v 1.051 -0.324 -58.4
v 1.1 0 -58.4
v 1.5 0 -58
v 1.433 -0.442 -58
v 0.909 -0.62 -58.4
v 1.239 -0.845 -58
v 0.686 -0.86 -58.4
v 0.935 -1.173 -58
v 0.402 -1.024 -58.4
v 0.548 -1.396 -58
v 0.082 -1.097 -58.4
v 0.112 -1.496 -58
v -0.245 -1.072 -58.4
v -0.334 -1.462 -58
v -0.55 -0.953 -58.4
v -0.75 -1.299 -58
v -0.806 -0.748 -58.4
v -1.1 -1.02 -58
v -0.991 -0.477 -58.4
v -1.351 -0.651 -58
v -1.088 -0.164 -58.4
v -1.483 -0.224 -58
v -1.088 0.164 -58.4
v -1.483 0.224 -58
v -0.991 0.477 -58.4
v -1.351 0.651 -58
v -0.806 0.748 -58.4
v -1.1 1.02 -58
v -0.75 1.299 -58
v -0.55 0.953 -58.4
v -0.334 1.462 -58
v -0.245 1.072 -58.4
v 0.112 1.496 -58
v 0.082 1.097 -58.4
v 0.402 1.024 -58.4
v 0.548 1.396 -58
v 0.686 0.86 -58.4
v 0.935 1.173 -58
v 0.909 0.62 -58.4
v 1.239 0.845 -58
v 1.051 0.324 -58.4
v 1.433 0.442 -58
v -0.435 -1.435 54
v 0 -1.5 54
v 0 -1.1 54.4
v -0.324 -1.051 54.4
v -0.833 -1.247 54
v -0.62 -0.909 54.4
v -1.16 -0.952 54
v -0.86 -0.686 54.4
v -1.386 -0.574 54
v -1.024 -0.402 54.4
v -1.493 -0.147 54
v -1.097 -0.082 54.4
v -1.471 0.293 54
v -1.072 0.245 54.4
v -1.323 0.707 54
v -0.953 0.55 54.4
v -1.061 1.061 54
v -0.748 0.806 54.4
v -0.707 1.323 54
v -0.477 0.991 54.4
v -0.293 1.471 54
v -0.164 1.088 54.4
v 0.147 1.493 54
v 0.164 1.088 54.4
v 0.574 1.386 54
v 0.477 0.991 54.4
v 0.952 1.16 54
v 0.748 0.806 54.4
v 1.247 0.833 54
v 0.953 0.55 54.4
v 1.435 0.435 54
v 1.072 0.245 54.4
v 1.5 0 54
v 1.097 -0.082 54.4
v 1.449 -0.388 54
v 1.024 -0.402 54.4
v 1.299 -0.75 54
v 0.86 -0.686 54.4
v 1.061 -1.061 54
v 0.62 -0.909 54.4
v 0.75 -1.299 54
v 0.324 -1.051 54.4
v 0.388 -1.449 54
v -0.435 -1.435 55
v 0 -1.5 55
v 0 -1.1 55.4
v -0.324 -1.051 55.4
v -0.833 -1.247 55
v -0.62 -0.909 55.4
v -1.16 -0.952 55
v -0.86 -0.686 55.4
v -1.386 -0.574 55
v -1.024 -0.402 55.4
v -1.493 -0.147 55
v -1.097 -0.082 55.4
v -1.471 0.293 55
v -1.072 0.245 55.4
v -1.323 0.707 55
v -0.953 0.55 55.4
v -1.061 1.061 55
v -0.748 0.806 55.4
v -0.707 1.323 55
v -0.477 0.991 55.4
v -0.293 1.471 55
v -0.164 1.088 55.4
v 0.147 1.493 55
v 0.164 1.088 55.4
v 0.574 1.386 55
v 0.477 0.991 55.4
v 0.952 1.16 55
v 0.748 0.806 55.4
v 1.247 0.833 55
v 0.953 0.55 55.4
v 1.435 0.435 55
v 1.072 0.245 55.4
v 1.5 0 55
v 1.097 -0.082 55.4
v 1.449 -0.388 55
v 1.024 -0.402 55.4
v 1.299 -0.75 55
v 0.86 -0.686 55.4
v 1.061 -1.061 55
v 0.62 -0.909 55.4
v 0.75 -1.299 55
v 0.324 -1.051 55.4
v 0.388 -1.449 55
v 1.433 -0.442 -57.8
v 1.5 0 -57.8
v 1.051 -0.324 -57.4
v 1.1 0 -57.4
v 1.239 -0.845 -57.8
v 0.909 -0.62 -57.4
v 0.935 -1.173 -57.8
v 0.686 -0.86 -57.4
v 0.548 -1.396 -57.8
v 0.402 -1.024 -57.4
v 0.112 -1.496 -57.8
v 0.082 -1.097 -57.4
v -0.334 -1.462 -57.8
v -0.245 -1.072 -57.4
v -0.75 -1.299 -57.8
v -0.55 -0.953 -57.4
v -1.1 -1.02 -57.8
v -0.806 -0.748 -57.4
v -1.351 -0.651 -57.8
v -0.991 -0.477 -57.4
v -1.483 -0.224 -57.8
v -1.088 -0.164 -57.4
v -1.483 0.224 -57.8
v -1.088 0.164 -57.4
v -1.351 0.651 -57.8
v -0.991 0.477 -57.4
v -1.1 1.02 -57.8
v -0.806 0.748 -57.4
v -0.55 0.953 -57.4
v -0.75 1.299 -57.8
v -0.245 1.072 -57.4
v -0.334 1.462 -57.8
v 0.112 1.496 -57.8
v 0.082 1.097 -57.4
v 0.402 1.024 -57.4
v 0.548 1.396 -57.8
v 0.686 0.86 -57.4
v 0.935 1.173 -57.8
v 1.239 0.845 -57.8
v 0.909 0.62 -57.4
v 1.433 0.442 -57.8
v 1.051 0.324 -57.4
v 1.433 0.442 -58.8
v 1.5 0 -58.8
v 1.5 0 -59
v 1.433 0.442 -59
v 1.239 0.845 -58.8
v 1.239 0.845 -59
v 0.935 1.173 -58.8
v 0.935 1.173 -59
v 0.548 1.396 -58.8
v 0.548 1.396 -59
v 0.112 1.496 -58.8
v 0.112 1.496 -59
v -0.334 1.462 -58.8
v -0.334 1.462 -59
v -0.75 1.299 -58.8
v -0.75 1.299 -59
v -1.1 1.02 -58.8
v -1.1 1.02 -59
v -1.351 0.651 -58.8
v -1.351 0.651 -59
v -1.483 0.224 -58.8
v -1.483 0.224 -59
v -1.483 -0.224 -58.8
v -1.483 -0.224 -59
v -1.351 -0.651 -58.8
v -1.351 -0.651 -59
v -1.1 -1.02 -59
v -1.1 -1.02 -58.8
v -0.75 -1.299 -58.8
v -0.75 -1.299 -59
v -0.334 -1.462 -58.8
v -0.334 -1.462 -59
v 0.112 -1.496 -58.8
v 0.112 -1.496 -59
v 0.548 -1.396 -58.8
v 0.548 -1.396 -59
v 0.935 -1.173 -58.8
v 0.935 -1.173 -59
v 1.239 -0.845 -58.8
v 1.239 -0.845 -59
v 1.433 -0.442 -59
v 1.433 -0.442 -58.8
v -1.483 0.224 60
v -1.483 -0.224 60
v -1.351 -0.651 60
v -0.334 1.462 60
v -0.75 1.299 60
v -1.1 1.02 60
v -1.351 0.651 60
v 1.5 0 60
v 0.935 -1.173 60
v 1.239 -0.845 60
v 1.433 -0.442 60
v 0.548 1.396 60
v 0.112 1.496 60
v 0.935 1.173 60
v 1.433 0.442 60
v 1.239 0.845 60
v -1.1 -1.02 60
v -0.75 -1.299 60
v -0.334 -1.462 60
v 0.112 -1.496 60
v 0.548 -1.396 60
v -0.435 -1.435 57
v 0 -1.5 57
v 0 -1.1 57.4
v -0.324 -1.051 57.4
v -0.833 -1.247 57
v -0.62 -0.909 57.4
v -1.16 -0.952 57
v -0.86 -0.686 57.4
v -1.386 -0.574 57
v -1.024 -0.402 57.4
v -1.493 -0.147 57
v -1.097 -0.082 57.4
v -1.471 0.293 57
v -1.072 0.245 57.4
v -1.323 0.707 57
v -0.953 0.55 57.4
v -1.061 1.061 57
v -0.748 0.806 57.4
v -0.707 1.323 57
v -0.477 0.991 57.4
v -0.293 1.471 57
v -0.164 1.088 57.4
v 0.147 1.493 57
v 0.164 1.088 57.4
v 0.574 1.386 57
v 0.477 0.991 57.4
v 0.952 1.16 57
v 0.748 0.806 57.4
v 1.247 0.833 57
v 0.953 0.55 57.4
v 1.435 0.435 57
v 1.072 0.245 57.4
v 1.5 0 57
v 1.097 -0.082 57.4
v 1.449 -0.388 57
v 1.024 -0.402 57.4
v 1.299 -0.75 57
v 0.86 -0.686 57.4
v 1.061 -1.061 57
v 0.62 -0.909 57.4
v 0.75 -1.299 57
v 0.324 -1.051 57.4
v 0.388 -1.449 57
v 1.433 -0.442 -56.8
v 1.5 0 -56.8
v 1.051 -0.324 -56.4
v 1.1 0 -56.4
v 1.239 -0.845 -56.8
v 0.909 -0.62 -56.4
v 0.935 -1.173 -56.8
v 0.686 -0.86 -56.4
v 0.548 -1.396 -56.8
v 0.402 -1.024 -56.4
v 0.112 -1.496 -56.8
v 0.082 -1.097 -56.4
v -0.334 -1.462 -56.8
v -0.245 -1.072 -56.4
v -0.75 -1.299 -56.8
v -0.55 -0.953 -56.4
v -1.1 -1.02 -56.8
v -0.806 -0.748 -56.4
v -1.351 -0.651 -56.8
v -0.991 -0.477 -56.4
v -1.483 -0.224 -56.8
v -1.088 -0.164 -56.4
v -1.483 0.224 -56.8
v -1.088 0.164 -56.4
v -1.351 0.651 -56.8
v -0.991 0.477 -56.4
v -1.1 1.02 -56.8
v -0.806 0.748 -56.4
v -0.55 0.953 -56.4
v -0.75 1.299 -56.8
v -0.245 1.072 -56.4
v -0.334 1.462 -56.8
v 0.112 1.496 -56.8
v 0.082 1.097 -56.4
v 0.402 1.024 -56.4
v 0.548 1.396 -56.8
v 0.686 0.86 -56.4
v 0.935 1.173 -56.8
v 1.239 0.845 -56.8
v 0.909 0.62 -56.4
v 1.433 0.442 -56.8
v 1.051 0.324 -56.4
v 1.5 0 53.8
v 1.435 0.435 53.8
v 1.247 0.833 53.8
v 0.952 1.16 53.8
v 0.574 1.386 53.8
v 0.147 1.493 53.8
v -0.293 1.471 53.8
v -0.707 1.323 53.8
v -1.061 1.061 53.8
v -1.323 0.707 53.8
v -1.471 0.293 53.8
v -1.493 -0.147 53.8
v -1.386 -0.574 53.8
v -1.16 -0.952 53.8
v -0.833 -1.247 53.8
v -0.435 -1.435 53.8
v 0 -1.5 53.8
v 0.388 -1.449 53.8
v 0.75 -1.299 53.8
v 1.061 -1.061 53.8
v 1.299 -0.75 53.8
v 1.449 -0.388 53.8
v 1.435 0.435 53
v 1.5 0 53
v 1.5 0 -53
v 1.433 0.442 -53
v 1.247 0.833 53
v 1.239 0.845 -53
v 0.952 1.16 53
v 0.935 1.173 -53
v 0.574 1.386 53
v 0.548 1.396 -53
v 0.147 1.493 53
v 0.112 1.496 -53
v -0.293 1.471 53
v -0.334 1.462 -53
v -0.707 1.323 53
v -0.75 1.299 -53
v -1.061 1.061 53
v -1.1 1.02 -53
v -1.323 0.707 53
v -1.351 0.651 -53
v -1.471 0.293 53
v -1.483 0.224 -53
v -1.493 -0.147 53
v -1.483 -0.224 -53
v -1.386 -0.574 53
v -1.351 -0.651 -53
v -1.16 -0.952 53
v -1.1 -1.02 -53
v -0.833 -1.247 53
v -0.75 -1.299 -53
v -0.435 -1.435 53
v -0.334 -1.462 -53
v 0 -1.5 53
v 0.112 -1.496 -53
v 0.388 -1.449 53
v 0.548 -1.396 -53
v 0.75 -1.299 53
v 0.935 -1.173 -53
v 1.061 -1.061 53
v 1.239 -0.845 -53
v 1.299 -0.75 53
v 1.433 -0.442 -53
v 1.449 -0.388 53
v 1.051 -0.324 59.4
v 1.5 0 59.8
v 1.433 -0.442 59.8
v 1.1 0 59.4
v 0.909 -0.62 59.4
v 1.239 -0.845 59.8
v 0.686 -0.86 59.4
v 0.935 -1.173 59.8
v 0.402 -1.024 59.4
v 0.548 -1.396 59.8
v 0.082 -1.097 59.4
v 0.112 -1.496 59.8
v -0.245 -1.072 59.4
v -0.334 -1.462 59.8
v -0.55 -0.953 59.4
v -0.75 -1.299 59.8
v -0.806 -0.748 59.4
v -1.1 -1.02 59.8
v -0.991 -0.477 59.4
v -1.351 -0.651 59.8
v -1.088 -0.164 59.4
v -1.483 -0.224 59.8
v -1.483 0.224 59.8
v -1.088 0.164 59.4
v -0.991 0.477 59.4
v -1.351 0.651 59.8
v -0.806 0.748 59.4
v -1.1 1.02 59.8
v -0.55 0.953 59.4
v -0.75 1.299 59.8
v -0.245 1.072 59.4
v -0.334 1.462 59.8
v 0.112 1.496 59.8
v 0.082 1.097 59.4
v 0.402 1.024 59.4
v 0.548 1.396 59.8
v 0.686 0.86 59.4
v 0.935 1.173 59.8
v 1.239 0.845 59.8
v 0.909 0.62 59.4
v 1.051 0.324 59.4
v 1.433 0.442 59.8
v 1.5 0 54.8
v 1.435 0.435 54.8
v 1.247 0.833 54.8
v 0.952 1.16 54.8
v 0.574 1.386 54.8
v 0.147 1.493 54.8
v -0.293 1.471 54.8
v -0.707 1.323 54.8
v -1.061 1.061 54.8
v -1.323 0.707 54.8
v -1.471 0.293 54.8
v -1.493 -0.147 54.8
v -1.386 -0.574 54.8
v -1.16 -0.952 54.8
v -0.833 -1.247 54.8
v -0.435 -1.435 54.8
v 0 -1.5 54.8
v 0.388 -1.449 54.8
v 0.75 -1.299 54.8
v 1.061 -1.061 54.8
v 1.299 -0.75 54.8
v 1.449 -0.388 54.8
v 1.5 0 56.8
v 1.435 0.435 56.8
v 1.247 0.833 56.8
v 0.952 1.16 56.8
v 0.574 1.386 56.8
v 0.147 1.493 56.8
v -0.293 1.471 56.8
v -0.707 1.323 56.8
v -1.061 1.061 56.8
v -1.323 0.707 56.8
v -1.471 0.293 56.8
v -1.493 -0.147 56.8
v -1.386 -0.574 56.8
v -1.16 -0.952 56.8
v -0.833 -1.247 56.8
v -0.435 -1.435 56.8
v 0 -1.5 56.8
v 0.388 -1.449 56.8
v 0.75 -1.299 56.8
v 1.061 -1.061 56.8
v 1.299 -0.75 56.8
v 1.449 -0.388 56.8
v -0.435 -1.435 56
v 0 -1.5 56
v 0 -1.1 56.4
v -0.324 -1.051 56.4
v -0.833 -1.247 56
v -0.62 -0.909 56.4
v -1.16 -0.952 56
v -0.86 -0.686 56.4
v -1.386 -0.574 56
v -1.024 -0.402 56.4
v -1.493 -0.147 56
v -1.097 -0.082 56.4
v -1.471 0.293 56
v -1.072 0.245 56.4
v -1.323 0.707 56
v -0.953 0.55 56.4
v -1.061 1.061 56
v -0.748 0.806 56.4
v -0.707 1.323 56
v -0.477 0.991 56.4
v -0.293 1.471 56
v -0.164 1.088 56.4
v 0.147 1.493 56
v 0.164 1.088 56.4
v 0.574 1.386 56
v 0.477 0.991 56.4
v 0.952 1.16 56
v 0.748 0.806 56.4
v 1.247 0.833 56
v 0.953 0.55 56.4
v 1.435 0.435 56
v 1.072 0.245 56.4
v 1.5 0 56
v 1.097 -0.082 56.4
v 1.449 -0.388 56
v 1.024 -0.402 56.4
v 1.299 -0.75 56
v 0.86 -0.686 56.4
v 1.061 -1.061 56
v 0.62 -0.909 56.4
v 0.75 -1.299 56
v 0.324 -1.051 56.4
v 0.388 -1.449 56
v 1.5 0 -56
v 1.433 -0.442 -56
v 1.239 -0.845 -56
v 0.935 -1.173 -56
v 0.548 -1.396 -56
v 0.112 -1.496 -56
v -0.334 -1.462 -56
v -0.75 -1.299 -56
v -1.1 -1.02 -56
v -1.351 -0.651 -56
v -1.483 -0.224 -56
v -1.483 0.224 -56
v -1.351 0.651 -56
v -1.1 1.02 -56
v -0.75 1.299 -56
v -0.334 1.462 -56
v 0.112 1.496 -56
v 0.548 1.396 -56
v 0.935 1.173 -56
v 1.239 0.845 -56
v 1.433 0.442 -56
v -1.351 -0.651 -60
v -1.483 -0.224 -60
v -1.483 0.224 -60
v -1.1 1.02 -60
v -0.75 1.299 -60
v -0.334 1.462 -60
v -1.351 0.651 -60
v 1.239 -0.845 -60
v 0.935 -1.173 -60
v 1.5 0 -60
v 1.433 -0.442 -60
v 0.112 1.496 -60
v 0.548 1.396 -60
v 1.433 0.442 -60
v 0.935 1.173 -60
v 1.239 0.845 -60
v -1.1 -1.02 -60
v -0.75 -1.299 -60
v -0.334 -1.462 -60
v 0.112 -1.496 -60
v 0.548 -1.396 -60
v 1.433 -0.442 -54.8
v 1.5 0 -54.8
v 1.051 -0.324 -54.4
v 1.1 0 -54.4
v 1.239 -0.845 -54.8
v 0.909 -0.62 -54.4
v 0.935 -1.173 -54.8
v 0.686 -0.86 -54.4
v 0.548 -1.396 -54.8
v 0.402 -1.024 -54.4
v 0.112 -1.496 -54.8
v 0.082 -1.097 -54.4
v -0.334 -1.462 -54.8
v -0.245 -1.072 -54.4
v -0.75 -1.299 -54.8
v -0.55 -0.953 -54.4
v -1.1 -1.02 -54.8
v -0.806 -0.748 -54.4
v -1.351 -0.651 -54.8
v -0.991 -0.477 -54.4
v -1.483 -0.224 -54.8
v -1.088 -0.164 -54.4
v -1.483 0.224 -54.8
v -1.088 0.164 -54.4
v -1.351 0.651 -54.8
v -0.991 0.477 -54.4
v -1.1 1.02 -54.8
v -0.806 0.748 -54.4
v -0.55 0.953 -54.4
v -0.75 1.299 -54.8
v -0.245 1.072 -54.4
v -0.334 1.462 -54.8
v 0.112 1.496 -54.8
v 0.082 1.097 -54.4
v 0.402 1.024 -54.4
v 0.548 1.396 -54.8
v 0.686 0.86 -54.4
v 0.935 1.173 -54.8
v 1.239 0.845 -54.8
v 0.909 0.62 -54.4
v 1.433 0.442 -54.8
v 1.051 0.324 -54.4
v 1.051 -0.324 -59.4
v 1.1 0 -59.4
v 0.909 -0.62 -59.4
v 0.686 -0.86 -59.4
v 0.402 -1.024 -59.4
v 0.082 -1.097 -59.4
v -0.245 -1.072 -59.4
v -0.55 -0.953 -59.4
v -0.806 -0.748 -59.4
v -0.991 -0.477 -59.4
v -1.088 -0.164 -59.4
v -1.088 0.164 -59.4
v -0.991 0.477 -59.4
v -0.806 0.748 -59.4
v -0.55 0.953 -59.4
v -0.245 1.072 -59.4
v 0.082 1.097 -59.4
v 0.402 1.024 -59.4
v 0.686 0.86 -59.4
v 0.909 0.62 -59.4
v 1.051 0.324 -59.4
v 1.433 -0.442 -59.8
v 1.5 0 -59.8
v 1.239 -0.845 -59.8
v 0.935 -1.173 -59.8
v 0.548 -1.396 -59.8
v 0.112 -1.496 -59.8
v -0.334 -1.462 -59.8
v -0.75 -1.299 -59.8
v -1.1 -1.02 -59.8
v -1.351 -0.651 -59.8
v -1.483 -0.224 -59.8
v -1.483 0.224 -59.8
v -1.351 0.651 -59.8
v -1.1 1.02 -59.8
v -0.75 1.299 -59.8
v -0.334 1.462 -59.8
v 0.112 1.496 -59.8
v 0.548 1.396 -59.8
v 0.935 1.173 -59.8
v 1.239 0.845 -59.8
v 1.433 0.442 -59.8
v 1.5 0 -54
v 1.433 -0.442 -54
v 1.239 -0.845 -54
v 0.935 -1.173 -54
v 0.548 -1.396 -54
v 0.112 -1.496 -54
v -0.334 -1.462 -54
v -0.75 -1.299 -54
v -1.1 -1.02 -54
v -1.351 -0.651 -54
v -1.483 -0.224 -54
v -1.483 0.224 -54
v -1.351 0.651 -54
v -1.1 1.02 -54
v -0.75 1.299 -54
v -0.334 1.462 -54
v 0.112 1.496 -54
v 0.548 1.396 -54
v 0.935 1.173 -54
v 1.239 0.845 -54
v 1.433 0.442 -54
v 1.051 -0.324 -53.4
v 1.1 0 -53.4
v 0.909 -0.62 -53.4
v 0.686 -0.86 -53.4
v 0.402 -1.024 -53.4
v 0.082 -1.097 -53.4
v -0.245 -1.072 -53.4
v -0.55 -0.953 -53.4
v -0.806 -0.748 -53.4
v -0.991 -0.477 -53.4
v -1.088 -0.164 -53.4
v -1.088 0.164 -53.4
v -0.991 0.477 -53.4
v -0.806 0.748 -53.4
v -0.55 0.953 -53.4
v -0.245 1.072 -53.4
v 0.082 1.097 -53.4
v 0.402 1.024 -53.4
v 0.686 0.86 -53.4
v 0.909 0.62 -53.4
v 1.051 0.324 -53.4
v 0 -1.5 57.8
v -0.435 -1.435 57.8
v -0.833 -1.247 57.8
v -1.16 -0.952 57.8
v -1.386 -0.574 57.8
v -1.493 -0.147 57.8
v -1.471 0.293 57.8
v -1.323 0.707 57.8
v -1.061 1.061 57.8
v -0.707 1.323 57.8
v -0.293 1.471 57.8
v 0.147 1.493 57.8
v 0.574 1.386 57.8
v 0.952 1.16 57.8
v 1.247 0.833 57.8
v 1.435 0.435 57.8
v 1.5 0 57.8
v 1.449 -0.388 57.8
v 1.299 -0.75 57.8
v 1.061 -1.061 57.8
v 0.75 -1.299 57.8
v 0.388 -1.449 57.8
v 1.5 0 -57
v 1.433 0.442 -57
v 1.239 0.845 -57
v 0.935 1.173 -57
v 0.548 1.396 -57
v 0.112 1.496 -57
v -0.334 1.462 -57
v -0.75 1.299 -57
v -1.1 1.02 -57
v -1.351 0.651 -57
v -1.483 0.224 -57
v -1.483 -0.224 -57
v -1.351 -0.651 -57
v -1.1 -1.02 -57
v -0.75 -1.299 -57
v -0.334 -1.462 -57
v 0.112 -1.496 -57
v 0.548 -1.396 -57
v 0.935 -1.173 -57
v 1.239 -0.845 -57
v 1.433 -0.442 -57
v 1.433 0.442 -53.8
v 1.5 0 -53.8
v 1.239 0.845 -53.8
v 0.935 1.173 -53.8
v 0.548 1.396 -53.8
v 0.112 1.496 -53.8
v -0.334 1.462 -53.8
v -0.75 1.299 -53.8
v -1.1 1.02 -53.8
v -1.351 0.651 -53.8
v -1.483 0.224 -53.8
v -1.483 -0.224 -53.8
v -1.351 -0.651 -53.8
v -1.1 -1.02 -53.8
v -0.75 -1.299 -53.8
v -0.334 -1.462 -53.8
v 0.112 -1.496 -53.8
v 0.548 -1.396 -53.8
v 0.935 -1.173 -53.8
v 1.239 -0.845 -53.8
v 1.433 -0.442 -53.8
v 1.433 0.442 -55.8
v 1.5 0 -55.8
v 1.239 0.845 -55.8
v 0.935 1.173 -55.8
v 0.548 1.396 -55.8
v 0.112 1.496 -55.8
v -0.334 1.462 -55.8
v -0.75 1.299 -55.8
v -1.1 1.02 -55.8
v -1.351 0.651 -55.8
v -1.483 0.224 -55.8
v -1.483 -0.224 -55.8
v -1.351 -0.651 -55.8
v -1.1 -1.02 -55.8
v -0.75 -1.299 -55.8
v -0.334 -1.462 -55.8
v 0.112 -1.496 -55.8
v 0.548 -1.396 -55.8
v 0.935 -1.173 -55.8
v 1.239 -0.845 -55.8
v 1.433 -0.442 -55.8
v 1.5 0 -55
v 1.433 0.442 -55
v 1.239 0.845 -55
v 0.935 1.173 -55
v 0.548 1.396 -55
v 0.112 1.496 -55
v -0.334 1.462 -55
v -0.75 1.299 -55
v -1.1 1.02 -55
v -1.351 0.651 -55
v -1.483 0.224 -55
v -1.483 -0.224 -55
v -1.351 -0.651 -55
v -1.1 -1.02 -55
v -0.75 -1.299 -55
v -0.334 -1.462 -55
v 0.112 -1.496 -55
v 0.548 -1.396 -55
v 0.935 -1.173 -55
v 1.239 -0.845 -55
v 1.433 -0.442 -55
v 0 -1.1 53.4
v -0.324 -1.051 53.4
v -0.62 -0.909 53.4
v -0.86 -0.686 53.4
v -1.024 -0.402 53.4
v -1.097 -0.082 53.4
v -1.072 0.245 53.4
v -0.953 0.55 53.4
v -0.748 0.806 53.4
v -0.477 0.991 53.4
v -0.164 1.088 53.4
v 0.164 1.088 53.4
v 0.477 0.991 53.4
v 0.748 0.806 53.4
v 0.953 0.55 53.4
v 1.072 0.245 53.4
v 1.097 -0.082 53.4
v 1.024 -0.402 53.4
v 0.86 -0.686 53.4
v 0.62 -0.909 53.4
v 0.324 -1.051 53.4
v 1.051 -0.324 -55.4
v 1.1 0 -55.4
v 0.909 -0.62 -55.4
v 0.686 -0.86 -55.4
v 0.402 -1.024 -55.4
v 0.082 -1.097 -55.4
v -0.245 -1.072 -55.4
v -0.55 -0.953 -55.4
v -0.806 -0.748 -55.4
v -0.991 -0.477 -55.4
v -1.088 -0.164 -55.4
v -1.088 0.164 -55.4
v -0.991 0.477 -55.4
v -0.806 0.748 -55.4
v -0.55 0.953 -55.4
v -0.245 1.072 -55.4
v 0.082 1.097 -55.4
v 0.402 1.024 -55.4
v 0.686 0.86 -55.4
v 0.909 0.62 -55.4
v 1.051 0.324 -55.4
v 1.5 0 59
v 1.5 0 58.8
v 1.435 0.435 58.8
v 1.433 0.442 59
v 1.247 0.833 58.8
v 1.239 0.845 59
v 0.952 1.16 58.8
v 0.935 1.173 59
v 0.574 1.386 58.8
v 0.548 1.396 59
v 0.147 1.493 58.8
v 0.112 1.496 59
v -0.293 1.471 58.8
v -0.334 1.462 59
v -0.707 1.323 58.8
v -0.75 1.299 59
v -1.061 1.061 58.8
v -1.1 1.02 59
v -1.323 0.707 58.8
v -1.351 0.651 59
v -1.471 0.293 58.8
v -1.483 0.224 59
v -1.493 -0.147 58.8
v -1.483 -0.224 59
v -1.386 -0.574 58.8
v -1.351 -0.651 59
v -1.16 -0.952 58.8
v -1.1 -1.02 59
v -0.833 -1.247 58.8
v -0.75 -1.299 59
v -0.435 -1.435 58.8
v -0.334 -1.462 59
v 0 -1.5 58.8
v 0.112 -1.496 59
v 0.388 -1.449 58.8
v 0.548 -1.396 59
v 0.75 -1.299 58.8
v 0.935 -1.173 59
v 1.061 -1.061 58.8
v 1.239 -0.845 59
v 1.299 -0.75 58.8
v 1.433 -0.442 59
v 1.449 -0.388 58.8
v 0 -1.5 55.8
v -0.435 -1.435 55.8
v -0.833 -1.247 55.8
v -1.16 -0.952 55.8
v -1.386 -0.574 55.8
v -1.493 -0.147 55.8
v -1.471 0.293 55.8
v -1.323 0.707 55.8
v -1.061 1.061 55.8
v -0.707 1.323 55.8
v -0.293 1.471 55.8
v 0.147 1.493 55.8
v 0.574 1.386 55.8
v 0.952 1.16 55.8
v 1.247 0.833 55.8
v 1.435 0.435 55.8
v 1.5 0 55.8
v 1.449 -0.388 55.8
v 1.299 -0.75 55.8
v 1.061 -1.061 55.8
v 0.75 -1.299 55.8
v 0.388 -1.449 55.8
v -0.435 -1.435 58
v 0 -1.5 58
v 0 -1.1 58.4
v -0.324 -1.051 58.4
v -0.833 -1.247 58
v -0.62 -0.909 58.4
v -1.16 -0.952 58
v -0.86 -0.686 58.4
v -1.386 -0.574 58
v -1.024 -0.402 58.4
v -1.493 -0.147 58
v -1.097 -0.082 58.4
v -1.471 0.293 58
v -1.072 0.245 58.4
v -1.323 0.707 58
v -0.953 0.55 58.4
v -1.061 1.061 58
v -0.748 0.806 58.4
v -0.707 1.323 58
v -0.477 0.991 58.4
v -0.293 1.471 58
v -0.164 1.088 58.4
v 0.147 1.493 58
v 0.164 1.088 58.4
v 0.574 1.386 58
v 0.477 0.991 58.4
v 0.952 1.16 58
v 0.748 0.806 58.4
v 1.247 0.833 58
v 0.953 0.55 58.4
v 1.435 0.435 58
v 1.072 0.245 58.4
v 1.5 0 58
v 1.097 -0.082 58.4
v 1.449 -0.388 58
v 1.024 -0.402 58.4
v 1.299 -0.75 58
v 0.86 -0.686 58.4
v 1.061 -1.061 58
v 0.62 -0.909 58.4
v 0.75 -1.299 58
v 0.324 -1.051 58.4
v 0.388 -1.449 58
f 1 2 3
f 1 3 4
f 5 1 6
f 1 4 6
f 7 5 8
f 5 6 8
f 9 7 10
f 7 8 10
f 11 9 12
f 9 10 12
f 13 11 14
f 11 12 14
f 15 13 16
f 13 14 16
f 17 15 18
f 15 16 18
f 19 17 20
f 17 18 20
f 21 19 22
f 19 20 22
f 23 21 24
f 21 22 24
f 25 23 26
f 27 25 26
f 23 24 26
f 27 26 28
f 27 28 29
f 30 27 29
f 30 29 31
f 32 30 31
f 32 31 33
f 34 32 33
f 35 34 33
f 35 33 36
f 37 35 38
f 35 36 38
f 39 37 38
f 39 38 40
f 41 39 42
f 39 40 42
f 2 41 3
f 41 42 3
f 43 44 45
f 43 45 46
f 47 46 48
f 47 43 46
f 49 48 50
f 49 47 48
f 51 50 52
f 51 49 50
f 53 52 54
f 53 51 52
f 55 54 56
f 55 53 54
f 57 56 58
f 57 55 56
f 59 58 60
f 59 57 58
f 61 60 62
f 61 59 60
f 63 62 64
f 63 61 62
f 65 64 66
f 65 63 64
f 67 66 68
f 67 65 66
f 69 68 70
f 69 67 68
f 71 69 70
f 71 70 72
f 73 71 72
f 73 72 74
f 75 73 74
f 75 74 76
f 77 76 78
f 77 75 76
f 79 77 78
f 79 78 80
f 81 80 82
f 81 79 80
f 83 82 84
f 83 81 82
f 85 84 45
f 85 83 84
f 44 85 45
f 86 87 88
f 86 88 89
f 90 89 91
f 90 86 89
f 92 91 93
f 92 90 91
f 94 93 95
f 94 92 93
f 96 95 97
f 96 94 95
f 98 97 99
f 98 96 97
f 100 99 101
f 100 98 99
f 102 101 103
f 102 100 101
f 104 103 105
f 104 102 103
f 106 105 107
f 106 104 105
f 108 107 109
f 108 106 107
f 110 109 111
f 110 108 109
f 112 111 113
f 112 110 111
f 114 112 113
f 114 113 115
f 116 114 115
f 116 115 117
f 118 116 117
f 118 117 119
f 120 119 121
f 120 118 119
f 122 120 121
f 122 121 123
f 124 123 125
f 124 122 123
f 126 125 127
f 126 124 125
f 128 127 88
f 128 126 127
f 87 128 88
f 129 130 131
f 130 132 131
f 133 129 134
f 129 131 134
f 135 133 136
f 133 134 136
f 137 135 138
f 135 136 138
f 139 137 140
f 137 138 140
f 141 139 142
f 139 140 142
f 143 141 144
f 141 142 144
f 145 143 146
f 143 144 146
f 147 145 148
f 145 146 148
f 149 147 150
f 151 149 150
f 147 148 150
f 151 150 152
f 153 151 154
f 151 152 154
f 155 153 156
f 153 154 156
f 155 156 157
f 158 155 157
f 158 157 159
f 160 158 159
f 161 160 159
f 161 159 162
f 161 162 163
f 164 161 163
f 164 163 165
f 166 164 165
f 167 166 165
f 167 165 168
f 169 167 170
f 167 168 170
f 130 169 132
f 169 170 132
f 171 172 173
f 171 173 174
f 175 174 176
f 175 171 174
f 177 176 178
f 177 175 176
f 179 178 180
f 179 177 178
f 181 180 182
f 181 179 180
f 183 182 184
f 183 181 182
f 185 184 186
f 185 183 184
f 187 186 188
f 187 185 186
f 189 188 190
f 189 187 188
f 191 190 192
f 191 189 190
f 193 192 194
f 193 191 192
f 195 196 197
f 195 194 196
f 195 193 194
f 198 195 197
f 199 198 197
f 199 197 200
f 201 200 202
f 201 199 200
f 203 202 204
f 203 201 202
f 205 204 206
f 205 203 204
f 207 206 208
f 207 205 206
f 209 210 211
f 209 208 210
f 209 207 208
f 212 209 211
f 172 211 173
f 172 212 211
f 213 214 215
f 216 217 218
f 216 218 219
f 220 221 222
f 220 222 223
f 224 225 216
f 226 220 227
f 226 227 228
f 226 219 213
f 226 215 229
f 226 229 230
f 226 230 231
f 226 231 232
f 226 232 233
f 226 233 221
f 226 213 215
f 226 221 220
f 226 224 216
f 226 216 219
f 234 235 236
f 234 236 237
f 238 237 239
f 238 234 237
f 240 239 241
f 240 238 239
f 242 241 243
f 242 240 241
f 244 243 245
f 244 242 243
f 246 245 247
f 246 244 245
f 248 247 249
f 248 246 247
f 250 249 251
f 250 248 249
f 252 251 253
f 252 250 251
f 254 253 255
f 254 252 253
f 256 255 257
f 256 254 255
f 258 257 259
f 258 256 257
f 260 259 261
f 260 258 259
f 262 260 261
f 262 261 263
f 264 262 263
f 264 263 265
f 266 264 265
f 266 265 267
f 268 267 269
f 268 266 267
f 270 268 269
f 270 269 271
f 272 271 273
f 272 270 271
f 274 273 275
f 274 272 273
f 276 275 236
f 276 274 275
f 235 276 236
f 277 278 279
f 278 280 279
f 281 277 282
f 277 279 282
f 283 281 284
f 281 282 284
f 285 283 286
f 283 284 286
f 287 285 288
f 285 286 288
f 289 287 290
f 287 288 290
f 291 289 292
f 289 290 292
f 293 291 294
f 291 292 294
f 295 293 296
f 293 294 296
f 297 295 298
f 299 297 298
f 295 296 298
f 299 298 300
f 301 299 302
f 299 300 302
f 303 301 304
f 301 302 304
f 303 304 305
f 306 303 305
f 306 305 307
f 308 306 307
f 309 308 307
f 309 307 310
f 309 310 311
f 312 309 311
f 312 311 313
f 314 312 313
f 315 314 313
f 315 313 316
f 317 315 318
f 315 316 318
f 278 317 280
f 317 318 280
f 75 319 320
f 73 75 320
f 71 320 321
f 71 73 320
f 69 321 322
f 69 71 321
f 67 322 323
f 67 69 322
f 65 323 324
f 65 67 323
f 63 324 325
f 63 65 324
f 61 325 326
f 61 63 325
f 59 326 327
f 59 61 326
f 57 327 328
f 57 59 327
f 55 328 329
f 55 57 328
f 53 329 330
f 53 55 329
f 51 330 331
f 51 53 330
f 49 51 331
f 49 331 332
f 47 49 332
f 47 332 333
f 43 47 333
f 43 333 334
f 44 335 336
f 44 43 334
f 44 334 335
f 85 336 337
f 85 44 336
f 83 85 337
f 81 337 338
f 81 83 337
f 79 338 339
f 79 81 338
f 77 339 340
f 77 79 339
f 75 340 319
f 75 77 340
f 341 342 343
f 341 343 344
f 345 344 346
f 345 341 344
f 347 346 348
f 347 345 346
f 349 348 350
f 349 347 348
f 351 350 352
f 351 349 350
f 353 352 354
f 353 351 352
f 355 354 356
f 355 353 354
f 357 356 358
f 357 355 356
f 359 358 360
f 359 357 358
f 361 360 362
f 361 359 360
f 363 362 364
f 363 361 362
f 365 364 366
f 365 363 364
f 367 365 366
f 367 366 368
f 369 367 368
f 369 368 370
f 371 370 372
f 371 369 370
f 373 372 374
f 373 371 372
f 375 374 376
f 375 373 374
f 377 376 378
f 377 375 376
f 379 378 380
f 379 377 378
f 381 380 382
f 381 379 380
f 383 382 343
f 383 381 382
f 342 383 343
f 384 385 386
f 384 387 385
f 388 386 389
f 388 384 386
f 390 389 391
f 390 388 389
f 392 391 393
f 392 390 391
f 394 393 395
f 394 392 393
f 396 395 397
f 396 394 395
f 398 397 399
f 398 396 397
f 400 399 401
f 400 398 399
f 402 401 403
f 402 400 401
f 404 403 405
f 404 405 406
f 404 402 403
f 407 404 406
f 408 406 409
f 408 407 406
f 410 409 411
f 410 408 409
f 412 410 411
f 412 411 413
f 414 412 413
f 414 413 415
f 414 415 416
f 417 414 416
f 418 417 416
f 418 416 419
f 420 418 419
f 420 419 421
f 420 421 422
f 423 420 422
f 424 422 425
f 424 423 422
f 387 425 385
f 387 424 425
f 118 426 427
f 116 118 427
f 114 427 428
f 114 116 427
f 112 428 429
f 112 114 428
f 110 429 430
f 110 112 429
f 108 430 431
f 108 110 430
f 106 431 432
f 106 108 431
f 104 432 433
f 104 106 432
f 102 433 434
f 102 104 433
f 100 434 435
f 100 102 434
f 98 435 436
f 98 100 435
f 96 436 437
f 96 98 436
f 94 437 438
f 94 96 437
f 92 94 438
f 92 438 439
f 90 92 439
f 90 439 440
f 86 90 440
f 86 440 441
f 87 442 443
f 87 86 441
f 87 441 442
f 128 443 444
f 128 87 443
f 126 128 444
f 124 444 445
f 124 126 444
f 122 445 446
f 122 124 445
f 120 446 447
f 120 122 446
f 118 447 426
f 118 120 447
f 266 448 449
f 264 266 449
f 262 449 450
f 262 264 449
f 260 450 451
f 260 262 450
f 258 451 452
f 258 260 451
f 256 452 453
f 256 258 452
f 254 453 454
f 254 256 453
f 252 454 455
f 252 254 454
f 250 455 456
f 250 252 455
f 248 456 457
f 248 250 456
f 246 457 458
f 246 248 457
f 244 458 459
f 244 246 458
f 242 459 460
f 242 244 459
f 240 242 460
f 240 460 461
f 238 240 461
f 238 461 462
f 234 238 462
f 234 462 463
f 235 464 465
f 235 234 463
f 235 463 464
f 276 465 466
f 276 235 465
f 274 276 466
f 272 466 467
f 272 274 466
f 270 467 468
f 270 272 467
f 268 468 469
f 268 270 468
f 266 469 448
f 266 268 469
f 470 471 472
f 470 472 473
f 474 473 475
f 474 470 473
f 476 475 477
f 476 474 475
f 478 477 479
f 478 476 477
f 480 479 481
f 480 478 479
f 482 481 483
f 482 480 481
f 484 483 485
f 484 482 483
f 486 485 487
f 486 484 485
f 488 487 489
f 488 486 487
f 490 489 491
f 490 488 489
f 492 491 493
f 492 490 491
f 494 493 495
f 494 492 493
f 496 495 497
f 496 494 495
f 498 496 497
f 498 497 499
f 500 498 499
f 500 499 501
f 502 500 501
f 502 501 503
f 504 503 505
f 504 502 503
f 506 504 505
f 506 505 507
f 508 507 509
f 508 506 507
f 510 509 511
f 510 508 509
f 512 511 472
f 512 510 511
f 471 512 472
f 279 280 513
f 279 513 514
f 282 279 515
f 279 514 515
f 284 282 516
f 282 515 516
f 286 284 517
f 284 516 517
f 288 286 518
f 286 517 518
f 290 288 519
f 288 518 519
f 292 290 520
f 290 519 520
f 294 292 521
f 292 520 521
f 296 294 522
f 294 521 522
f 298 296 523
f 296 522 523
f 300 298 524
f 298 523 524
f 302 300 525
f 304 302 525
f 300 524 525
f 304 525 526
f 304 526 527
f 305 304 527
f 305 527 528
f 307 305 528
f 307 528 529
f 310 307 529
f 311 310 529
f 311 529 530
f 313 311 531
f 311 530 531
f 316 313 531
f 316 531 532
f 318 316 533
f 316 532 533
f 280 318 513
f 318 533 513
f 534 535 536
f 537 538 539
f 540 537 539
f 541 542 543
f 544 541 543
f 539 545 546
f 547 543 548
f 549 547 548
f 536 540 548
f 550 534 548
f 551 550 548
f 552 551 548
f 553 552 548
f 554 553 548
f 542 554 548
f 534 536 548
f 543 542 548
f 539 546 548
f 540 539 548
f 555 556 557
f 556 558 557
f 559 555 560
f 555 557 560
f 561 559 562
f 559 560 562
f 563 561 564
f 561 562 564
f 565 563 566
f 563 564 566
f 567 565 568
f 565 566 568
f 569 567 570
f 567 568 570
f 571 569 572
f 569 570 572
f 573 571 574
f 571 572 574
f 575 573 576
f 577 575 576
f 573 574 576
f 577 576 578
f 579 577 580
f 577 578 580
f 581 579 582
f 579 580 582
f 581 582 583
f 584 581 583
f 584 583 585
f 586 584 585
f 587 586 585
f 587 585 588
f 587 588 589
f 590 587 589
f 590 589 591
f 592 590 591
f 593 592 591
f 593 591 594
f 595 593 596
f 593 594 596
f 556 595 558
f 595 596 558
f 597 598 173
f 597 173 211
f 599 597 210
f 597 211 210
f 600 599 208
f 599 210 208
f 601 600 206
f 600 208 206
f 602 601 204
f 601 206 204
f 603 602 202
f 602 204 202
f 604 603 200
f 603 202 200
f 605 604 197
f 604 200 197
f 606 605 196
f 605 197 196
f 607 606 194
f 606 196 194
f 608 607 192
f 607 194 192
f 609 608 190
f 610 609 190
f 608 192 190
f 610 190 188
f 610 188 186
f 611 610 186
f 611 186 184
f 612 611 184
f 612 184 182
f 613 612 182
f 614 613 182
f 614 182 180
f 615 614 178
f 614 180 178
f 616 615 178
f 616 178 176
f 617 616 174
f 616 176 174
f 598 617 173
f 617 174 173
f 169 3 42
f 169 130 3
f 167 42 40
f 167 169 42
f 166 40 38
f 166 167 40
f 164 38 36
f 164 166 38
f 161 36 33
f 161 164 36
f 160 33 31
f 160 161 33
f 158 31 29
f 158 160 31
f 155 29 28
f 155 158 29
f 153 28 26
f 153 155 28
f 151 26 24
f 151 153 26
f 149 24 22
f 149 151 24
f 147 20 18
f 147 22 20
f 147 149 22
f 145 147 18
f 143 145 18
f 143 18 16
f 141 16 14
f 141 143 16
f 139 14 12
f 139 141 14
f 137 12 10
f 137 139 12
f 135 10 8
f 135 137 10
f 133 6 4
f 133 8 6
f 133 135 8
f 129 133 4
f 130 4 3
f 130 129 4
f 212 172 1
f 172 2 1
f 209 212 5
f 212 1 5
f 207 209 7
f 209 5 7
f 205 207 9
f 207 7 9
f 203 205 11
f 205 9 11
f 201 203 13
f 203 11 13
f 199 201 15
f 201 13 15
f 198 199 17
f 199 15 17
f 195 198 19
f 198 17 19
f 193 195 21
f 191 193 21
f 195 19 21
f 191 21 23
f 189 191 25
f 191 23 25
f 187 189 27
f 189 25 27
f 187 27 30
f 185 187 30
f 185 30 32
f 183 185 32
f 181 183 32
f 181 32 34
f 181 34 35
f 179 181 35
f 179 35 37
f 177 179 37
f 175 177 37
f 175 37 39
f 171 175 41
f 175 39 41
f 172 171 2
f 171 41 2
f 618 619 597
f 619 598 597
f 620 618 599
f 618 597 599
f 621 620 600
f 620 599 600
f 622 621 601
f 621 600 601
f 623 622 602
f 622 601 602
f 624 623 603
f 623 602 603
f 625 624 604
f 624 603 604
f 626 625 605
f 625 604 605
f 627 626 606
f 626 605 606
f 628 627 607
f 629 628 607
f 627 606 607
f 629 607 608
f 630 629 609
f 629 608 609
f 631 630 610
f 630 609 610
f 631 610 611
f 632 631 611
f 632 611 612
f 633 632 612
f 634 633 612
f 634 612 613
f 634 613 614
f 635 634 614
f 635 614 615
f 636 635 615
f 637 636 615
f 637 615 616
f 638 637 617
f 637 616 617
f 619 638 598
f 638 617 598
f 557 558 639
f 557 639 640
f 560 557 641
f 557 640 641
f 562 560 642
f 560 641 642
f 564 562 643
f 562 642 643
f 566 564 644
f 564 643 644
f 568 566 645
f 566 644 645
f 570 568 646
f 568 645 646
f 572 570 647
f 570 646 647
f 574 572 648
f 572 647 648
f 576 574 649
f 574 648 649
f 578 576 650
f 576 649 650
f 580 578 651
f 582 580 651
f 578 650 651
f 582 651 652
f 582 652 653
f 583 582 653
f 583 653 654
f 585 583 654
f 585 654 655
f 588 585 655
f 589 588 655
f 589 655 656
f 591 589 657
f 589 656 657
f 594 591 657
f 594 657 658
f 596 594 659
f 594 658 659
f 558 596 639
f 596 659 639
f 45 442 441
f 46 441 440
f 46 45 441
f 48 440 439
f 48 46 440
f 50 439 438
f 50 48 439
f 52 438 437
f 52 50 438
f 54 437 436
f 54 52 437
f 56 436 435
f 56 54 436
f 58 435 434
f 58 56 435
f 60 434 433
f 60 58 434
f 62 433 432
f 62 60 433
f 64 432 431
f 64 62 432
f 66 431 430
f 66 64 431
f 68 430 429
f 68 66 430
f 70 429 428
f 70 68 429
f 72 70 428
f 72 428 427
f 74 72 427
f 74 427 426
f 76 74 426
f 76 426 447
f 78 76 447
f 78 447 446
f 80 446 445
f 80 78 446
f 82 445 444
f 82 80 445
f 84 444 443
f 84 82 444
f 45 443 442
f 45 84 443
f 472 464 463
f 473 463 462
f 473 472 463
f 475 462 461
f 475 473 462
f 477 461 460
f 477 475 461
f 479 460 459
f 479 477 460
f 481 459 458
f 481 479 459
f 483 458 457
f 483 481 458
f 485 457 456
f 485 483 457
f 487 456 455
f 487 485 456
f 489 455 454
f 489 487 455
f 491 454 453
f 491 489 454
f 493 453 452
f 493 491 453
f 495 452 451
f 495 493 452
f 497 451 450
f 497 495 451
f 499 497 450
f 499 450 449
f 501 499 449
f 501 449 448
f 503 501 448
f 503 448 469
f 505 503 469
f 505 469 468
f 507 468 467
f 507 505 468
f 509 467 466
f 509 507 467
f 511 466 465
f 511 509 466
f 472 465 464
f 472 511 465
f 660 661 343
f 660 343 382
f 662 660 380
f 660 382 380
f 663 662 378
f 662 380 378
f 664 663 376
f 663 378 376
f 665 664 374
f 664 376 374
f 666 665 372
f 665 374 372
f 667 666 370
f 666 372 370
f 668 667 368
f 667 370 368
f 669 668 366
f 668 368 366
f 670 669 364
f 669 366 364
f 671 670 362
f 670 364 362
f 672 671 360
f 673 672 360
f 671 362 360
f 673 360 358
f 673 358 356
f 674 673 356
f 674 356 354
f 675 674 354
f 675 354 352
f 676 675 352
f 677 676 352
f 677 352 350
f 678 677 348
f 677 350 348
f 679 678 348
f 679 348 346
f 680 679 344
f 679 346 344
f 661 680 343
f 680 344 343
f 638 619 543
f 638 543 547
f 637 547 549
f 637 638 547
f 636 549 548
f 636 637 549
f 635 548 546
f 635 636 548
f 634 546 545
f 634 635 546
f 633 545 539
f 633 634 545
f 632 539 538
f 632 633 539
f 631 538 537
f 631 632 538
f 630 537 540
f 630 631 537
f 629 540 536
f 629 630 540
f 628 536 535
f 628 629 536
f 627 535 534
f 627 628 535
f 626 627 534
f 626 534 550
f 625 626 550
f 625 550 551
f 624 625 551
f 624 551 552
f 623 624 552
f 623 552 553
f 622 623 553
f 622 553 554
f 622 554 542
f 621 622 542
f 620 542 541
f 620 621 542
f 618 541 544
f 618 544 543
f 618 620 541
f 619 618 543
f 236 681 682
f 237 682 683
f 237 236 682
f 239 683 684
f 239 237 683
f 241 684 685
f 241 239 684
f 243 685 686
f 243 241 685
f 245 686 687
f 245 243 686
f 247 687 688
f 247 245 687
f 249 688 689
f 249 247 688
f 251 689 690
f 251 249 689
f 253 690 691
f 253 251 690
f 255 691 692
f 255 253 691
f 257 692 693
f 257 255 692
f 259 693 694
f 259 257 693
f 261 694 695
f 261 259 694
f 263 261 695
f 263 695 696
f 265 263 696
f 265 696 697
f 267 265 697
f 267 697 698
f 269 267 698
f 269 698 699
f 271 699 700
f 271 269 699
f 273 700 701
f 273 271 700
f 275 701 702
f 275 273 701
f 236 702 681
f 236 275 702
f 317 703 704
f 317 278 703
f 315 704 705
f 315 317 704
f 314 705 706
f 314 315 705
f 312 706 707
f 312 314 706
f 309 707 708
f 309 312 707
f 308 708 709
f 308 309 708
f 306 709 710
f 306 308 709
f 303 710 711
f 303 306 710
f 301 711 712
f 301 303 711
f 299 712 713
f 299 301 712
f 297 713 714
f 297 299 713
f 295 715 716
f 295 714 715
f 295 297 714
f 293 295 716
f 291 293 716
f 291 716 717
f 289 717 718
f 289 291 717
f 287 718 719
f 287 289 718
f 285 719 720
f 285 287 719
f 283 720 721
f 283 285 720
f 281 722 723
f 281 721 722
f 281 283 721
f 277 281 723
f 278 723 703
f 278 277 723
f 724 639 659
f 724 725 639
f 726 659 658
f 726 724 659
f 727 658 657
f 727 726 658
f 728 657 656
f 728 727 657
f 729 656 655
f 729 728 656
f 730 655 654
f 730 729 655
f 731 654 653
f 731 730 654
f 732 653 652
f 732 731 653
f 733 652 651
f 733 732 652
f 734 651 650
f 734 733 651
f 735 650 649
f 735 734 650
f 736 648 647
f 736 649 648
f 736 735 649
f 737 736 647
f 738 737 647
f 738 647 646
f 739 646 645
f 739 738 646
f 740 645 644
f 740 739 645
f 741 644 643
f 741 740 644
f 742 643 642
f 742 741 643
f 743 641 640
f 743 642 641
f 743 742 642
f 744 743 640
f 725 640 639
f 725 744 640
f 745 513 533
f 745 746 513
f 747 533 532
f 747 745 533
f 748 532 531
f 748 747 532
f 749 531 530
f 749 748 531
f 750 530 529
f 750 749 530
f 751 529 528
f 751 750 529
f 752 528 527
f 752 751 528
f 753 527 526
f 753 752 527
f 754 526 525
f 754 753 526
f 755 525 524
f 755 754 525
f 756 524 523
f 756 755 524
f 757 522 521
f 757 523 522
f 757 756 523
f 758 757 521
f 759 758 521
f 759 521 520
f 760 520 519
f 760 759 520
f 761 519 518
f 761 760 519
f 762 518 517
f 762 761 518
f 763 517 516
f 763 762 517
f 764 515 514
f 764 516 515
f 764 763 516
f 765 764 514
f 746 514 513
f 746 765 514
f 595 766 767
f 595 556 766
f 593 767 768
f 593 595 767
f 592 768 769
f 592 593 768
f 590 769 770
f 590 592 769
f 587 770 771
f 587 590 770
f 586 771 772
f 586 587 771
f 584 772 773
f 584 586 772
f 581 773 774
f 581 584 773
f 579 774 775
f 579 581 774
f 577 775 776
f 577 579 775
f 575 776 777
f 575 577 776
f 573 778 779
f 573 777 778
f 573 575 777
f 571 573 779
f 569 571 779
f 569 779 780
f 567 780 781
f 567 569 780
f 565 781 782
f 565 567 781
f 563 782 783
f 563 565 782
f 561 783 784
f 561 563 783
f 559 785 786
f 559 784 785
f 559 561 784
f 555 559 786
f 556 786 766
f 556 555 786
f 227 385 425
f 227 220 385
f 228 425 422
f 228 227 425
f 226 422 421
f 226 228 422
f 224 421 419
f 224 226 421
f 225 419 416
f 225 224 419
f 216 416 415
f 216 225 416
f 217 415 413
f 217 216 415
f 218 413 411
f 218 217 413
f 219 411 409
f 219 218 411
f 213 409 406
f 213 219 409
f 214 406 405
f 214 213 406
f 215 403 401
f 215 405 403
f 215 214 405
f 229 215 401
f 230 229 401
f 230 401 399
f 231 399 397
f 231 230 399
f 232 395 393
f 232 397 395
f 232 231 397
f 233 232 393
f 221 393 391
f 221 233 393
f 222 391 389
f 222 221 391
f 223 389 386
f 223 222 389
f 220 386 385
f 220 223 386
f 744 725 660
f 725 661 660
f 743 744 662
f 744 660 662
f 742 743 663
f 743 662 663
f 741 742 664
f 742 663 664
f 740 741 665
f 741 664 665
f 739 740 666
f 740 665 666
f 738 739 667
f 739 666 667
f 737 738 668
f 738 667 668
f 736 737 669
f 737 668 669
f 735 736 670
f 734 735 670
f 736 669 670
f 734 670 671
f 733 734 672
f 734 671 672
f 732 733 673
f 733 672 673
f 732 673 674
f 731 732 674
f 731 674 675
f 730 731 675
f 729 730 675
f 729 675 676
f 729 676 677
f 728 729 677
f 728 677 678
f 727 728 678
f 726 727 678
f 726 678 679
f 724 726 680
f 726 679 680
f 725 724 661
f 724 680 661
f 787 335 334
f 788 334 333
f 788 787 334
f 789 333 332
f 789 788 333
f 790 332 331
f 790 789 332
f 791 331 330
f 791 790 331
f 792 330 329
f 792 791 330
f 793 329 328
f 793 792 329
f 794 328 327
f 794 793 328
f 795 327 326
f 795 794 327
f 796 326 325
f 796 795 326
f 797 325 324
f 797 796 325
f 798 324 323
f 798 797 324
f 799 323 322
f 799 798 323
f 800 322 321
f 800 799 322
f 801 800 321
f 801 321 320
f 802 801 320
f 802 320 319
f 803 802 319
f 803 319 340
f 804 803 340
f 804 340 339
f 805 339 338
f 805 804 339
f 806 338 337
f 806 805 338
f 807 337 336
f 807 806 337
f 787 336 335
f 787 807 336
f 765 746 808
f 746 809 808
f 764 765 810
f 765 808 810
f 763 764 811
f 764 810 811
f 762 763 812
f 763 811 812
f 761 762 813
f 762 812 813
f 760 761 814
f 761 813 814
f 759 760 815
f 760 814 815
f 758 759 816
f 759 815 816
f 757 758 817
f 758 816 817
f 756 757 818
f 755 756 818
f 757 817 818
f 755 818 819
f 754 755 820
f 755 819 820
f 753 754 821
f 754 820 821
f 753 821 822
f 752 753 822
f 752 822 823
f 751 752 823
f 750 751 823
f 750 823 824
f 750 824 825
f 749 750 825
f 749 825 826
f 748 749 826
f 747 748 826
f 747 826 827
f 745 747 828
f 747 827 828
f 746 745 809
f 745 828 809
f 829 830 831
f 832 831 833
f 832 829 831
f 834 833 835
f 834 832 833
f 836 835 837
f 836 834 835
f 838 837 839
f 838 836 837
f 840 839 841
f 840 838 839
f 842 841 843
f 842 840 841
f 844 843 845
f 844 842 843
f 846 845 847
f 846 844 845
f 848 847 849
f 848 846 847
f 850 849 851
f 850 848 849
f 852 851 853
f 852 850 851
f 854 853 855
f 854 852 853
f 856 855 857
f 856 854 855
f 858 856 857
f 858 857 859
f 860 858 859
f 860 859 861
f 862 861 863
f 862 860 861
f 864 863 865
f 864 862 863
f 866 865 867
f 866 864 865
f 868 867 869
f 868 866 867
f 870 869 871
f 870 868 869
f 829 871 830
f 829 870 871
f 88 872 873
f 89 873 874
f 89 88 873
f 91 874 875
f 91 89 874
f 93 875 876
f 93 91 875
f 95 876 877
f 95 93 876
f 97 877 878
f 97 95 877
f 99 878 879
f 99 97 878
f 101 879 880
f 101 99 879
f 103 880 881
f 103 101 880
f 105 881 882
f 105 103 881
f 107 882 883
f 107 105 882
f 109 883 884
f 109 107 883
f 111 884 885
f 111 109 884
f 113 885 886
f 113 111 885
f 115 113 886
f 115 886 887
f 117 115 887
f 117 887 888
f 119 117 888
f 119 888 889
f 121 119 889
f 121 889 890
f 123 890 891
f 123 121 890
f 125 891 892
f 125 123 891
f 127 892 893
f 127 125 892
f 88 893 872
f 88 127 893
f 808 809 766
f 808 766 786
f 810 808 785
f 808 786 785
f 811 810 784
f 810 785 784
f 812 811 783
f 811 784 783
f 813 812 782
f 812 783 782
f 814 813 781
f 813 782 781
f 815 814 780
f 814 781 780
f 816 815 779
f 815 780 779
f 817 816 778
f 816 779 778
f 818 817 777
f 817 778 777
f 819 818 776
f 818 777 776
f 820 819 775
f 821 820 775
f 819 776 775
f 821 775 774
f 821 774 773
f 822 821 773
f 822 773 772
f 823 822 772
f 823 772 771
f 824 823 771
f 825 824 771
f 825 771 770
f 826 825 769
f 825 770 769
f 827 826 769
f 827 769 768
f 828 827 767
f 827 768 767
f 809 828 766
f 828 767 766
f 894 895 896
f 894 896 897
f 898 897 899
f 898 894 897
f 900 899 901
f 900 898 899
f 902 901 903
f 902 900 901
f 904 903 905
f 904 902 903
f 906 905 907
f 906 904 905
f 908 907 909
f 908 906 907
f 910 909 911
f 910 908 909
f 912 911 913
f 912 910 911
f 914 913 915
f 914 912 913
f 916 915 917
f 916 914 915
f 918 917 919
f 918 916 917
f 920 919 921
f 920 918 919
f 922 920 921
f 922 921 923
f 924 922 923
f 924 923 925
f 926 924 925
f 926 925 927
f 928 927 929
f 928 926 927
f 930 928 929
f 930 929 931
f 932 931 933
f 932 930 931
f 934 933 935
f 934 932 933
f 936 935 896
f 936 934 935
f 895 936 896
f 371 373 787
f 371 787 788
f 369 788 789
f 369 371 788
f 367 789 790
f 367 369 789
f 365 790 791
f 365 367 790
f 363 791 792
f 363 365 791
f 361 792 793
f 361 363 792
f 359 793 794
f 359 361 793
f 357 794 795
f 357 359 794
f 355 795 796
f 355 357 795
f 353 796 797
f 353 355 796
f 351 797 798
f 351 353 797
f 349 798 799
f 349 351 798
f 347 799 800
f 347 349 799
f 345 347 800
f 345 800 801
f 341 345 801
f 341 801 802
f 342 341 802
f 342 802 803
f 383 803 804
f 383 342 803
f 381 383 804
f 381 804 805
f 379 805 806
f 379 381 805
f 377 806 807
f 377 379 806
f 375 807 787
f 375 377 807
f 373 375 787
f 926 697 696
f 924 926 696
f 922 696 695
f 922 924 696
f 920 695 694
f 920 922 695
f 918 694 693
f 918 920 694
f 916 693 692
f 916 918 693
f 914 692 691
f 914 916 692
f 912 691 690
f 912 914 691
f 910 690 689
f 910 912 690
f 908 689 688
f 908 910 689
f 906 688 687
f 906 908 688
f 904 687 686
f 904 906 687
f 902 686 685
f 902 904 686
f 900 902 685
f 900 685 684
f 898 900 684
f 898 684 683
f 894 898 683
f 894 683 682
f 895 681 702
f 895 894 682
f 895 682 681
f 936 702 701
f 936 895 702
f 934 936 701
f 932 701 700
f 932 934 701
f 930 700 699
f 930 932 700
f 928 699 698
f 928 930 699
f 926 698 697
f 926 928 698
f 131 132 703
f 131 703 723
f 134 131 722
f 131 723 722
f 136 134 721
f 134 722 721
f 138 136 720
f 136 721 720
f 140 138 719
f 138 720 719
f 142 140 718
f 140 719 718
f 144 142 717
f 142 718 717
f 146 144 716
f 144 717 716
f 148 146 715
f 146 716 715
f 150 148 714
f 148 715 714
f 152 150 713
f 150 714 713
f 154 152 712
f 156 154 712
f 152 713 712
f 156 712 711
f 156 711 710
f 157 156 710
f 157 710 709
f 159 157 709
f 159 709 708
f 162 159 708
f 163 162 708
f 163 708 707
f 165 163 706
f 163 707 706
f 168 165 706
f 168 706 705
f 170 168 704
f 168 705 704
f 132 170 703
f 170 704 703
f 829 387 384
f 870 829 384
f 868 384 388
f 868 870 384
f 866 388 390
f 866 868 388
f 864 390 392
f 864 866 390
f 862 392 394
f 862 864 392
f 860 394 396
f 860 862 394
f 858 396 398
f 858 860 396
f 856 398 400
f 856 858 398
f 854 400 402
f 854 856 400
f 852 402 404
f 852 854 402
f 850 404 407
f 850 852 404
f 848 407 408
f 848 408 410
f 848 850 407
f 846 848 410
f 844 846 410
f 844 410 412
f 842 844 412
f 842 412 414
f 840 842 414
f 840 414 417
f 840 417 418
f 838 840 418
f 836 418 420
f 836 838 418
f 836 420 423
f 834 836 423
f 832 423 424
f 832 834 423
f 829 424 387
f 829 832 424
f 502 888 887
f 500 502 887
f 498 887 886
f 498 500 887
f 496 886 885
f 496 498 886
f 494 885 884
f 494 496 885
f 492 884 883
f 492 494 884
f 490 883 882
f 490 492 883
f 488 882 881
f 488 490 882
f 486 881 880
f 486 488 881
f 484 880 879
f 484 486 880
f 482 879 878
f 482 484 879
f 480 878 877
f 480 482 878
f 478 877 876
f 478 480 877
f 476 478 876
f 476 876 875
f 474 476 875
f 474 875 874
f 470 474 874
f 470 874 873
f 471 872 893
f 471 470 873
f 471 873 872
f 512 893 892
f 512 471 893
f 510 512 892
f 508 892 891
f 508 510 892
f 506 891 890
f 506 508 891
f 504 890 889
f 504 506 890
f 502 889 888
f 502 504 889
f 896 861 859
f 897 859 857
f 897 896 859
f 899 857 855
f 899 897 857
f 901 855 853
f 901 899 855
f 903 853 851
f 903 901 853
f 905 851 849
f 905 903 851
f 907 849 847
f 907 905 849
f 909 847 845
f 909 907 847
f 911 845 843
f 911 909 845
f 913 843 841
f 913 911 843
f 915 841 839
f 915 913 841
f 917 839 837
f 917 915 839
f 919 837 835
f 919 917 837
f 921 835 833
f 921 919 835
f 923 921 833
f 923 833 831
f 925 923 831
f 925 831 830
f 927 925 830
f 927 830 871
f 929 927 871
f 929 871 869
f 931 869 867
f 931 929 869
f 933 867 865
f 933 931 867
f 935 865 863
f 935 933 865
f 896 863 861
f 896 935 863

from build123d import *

# Parameters (mm, degrees)
SKETCH1_R           = 1.5
BOSS_EXTRUDE1_DEPTH = 60
LPATTERN1_COUNT     = 7
LPATTERN1_PITCH     = 1


with BuildPart() as part:
    # Sketch1 → Boss-Extrude1 (new, symmetric)
    with BuildSketch(Plane.XY):
        Circle(SKETCH1_R)
    extrude(amount=BOSS_EXTRUDE1_DEPTH, both=True)

    # Sketch2 → Cut-Revolve1 (revolve, cut)
    with BuildSketch(Plane(origin=(0, 0, 0), x_dir=(0, 0, -1), z_dir=(1, 0, 0)), mode=Mode.PRIVATE) as cut_revolve1_sk:
        Polygon((59.8, -1.5), (59.4, -1.1), (59, -1.5), (59, -1.898251276), (59.8, -1.898251276), align=None)
    cut_revolve1 = revolve(cut_revolve1_sk.sketch.rotate(Axis((0, 0, 60), (0, 0, -1)), 270), axis=Axis((0, 0, 60), (0, 0, -1)), mode=Mode.SUBTRACT)

    # LPattern1: Cut-Revolve1 ×7
    with Locations(*[(0, 0, i * LPATTERN1_PITCH) for i in range(1, LPATTERN1_COUNT)]):
        add(cut_revolve1, mode=Mode.SUBTRACT)

    # Mirror1: Cut-Revolve1 across plane
    add(cut_revolve1.mirror(Plane.XY), mode=Mode.SUBTRACT)

    # Mirror1 copy 1 sketch → Mirror1 copy 1 (revolve, cut)
    with BuildSketch(Plane(origin=(0, 0, -1), x_dir=(0, 0, 1), z_dir=(1, 0, 0))):
        Polygon((59.8, 1.5), (59.4, 1.1), (59, 1.5), (59, 1.898251276), (59.8, 1.898251276), align=None)
    revolve(axis=Axis((0, 0, -61), (0, 0, -1)), mode=Mode.SUBTRACT)

    # Mirror1 copy 2 sketch → Mirror1 copy 2 (revolve, cut)
    with BuildSketch(Plane(origin=(0, 0, -2), x_dir=(0, 0, 1), z_dir=(1, 0, 0))):
        Polygon((59.8, 1.5), (59.4, 1.1), (59, 1.5), (59, 1.898251276), (59.8, 1.898251276), align=None)
    revolve(axis=Axis((0, 0, -62), (0, 0, -1)), mode=Mode.SUBTRACT)

    # Mirror1 copy 3 sketch → Mirror1 copy 3 (revolve, cut)
    with BuildSketch(Plane(origin=(0, 0, -3), x_dir=(0, 0, 1), z_dir=(1, 0, 0))):
        Polygon((59.8, 1.5), (59.4, 1.1), (59, 1.5), (59, 1.898251276), (59.8, 1.898251276), align=None)
    revolve(axis=Axis((0, 0, -63), (0, 0, -1)), mode=Mode.SUBTRACT)

    # Mirror1 copy 4 sketch → Mirror1 copy 4 (revolve, cut)
    with BuildSketch(Plane(origin=(0, 0, -4), x_dir=(0, 0, 1), z_dir=(1, 0, 0))):
        Polygon((59.8, 1.5), (59.4, 1.1), (59, 1.5), (59, 1.898251276), (59.8, 1.898251276), align=None)
    revolve(axis=Axis((0, 0, -64), (0, 0, -1)), mode=Mode.SUBTRACT)

    # Mirror1 copy 5 sketch → Mirror1 copy 5 (revolve, cut)
    with BuildSketch(Plane(origin=(0, 0, -5), x_dir=(0, 0, 1), z_dir=(1, 0, 0))):
        Polygon((59.8, 1.5), (59.4, 1.1), (59, 1.5), (59, 1.898251276), (59.8, 1.898251276), align=None)
    revolve(axis=Axis((0, 0, -65), (0, 0, -1)), mode=Mode.SUBTRACT)

    # Mirror1 copy 6 sketch → Mirror1 copy 6 (revolve, cut)
    with BuildSketch(Plane(origin=(0, 0, -6), x_dir=(0, 0, 1), z_dir=(1, 0, 0))):
        Polygon((59.8, 1.5), (59.4, 1.1), (59, 1.5), (59, 1.898251276), (59.8, 1.898251276), align=None)
    revolve(axis=Axis((0, 0, -66), (0, 0, -1)), mode=Mode.SUBTRACT)


solid = part.part
